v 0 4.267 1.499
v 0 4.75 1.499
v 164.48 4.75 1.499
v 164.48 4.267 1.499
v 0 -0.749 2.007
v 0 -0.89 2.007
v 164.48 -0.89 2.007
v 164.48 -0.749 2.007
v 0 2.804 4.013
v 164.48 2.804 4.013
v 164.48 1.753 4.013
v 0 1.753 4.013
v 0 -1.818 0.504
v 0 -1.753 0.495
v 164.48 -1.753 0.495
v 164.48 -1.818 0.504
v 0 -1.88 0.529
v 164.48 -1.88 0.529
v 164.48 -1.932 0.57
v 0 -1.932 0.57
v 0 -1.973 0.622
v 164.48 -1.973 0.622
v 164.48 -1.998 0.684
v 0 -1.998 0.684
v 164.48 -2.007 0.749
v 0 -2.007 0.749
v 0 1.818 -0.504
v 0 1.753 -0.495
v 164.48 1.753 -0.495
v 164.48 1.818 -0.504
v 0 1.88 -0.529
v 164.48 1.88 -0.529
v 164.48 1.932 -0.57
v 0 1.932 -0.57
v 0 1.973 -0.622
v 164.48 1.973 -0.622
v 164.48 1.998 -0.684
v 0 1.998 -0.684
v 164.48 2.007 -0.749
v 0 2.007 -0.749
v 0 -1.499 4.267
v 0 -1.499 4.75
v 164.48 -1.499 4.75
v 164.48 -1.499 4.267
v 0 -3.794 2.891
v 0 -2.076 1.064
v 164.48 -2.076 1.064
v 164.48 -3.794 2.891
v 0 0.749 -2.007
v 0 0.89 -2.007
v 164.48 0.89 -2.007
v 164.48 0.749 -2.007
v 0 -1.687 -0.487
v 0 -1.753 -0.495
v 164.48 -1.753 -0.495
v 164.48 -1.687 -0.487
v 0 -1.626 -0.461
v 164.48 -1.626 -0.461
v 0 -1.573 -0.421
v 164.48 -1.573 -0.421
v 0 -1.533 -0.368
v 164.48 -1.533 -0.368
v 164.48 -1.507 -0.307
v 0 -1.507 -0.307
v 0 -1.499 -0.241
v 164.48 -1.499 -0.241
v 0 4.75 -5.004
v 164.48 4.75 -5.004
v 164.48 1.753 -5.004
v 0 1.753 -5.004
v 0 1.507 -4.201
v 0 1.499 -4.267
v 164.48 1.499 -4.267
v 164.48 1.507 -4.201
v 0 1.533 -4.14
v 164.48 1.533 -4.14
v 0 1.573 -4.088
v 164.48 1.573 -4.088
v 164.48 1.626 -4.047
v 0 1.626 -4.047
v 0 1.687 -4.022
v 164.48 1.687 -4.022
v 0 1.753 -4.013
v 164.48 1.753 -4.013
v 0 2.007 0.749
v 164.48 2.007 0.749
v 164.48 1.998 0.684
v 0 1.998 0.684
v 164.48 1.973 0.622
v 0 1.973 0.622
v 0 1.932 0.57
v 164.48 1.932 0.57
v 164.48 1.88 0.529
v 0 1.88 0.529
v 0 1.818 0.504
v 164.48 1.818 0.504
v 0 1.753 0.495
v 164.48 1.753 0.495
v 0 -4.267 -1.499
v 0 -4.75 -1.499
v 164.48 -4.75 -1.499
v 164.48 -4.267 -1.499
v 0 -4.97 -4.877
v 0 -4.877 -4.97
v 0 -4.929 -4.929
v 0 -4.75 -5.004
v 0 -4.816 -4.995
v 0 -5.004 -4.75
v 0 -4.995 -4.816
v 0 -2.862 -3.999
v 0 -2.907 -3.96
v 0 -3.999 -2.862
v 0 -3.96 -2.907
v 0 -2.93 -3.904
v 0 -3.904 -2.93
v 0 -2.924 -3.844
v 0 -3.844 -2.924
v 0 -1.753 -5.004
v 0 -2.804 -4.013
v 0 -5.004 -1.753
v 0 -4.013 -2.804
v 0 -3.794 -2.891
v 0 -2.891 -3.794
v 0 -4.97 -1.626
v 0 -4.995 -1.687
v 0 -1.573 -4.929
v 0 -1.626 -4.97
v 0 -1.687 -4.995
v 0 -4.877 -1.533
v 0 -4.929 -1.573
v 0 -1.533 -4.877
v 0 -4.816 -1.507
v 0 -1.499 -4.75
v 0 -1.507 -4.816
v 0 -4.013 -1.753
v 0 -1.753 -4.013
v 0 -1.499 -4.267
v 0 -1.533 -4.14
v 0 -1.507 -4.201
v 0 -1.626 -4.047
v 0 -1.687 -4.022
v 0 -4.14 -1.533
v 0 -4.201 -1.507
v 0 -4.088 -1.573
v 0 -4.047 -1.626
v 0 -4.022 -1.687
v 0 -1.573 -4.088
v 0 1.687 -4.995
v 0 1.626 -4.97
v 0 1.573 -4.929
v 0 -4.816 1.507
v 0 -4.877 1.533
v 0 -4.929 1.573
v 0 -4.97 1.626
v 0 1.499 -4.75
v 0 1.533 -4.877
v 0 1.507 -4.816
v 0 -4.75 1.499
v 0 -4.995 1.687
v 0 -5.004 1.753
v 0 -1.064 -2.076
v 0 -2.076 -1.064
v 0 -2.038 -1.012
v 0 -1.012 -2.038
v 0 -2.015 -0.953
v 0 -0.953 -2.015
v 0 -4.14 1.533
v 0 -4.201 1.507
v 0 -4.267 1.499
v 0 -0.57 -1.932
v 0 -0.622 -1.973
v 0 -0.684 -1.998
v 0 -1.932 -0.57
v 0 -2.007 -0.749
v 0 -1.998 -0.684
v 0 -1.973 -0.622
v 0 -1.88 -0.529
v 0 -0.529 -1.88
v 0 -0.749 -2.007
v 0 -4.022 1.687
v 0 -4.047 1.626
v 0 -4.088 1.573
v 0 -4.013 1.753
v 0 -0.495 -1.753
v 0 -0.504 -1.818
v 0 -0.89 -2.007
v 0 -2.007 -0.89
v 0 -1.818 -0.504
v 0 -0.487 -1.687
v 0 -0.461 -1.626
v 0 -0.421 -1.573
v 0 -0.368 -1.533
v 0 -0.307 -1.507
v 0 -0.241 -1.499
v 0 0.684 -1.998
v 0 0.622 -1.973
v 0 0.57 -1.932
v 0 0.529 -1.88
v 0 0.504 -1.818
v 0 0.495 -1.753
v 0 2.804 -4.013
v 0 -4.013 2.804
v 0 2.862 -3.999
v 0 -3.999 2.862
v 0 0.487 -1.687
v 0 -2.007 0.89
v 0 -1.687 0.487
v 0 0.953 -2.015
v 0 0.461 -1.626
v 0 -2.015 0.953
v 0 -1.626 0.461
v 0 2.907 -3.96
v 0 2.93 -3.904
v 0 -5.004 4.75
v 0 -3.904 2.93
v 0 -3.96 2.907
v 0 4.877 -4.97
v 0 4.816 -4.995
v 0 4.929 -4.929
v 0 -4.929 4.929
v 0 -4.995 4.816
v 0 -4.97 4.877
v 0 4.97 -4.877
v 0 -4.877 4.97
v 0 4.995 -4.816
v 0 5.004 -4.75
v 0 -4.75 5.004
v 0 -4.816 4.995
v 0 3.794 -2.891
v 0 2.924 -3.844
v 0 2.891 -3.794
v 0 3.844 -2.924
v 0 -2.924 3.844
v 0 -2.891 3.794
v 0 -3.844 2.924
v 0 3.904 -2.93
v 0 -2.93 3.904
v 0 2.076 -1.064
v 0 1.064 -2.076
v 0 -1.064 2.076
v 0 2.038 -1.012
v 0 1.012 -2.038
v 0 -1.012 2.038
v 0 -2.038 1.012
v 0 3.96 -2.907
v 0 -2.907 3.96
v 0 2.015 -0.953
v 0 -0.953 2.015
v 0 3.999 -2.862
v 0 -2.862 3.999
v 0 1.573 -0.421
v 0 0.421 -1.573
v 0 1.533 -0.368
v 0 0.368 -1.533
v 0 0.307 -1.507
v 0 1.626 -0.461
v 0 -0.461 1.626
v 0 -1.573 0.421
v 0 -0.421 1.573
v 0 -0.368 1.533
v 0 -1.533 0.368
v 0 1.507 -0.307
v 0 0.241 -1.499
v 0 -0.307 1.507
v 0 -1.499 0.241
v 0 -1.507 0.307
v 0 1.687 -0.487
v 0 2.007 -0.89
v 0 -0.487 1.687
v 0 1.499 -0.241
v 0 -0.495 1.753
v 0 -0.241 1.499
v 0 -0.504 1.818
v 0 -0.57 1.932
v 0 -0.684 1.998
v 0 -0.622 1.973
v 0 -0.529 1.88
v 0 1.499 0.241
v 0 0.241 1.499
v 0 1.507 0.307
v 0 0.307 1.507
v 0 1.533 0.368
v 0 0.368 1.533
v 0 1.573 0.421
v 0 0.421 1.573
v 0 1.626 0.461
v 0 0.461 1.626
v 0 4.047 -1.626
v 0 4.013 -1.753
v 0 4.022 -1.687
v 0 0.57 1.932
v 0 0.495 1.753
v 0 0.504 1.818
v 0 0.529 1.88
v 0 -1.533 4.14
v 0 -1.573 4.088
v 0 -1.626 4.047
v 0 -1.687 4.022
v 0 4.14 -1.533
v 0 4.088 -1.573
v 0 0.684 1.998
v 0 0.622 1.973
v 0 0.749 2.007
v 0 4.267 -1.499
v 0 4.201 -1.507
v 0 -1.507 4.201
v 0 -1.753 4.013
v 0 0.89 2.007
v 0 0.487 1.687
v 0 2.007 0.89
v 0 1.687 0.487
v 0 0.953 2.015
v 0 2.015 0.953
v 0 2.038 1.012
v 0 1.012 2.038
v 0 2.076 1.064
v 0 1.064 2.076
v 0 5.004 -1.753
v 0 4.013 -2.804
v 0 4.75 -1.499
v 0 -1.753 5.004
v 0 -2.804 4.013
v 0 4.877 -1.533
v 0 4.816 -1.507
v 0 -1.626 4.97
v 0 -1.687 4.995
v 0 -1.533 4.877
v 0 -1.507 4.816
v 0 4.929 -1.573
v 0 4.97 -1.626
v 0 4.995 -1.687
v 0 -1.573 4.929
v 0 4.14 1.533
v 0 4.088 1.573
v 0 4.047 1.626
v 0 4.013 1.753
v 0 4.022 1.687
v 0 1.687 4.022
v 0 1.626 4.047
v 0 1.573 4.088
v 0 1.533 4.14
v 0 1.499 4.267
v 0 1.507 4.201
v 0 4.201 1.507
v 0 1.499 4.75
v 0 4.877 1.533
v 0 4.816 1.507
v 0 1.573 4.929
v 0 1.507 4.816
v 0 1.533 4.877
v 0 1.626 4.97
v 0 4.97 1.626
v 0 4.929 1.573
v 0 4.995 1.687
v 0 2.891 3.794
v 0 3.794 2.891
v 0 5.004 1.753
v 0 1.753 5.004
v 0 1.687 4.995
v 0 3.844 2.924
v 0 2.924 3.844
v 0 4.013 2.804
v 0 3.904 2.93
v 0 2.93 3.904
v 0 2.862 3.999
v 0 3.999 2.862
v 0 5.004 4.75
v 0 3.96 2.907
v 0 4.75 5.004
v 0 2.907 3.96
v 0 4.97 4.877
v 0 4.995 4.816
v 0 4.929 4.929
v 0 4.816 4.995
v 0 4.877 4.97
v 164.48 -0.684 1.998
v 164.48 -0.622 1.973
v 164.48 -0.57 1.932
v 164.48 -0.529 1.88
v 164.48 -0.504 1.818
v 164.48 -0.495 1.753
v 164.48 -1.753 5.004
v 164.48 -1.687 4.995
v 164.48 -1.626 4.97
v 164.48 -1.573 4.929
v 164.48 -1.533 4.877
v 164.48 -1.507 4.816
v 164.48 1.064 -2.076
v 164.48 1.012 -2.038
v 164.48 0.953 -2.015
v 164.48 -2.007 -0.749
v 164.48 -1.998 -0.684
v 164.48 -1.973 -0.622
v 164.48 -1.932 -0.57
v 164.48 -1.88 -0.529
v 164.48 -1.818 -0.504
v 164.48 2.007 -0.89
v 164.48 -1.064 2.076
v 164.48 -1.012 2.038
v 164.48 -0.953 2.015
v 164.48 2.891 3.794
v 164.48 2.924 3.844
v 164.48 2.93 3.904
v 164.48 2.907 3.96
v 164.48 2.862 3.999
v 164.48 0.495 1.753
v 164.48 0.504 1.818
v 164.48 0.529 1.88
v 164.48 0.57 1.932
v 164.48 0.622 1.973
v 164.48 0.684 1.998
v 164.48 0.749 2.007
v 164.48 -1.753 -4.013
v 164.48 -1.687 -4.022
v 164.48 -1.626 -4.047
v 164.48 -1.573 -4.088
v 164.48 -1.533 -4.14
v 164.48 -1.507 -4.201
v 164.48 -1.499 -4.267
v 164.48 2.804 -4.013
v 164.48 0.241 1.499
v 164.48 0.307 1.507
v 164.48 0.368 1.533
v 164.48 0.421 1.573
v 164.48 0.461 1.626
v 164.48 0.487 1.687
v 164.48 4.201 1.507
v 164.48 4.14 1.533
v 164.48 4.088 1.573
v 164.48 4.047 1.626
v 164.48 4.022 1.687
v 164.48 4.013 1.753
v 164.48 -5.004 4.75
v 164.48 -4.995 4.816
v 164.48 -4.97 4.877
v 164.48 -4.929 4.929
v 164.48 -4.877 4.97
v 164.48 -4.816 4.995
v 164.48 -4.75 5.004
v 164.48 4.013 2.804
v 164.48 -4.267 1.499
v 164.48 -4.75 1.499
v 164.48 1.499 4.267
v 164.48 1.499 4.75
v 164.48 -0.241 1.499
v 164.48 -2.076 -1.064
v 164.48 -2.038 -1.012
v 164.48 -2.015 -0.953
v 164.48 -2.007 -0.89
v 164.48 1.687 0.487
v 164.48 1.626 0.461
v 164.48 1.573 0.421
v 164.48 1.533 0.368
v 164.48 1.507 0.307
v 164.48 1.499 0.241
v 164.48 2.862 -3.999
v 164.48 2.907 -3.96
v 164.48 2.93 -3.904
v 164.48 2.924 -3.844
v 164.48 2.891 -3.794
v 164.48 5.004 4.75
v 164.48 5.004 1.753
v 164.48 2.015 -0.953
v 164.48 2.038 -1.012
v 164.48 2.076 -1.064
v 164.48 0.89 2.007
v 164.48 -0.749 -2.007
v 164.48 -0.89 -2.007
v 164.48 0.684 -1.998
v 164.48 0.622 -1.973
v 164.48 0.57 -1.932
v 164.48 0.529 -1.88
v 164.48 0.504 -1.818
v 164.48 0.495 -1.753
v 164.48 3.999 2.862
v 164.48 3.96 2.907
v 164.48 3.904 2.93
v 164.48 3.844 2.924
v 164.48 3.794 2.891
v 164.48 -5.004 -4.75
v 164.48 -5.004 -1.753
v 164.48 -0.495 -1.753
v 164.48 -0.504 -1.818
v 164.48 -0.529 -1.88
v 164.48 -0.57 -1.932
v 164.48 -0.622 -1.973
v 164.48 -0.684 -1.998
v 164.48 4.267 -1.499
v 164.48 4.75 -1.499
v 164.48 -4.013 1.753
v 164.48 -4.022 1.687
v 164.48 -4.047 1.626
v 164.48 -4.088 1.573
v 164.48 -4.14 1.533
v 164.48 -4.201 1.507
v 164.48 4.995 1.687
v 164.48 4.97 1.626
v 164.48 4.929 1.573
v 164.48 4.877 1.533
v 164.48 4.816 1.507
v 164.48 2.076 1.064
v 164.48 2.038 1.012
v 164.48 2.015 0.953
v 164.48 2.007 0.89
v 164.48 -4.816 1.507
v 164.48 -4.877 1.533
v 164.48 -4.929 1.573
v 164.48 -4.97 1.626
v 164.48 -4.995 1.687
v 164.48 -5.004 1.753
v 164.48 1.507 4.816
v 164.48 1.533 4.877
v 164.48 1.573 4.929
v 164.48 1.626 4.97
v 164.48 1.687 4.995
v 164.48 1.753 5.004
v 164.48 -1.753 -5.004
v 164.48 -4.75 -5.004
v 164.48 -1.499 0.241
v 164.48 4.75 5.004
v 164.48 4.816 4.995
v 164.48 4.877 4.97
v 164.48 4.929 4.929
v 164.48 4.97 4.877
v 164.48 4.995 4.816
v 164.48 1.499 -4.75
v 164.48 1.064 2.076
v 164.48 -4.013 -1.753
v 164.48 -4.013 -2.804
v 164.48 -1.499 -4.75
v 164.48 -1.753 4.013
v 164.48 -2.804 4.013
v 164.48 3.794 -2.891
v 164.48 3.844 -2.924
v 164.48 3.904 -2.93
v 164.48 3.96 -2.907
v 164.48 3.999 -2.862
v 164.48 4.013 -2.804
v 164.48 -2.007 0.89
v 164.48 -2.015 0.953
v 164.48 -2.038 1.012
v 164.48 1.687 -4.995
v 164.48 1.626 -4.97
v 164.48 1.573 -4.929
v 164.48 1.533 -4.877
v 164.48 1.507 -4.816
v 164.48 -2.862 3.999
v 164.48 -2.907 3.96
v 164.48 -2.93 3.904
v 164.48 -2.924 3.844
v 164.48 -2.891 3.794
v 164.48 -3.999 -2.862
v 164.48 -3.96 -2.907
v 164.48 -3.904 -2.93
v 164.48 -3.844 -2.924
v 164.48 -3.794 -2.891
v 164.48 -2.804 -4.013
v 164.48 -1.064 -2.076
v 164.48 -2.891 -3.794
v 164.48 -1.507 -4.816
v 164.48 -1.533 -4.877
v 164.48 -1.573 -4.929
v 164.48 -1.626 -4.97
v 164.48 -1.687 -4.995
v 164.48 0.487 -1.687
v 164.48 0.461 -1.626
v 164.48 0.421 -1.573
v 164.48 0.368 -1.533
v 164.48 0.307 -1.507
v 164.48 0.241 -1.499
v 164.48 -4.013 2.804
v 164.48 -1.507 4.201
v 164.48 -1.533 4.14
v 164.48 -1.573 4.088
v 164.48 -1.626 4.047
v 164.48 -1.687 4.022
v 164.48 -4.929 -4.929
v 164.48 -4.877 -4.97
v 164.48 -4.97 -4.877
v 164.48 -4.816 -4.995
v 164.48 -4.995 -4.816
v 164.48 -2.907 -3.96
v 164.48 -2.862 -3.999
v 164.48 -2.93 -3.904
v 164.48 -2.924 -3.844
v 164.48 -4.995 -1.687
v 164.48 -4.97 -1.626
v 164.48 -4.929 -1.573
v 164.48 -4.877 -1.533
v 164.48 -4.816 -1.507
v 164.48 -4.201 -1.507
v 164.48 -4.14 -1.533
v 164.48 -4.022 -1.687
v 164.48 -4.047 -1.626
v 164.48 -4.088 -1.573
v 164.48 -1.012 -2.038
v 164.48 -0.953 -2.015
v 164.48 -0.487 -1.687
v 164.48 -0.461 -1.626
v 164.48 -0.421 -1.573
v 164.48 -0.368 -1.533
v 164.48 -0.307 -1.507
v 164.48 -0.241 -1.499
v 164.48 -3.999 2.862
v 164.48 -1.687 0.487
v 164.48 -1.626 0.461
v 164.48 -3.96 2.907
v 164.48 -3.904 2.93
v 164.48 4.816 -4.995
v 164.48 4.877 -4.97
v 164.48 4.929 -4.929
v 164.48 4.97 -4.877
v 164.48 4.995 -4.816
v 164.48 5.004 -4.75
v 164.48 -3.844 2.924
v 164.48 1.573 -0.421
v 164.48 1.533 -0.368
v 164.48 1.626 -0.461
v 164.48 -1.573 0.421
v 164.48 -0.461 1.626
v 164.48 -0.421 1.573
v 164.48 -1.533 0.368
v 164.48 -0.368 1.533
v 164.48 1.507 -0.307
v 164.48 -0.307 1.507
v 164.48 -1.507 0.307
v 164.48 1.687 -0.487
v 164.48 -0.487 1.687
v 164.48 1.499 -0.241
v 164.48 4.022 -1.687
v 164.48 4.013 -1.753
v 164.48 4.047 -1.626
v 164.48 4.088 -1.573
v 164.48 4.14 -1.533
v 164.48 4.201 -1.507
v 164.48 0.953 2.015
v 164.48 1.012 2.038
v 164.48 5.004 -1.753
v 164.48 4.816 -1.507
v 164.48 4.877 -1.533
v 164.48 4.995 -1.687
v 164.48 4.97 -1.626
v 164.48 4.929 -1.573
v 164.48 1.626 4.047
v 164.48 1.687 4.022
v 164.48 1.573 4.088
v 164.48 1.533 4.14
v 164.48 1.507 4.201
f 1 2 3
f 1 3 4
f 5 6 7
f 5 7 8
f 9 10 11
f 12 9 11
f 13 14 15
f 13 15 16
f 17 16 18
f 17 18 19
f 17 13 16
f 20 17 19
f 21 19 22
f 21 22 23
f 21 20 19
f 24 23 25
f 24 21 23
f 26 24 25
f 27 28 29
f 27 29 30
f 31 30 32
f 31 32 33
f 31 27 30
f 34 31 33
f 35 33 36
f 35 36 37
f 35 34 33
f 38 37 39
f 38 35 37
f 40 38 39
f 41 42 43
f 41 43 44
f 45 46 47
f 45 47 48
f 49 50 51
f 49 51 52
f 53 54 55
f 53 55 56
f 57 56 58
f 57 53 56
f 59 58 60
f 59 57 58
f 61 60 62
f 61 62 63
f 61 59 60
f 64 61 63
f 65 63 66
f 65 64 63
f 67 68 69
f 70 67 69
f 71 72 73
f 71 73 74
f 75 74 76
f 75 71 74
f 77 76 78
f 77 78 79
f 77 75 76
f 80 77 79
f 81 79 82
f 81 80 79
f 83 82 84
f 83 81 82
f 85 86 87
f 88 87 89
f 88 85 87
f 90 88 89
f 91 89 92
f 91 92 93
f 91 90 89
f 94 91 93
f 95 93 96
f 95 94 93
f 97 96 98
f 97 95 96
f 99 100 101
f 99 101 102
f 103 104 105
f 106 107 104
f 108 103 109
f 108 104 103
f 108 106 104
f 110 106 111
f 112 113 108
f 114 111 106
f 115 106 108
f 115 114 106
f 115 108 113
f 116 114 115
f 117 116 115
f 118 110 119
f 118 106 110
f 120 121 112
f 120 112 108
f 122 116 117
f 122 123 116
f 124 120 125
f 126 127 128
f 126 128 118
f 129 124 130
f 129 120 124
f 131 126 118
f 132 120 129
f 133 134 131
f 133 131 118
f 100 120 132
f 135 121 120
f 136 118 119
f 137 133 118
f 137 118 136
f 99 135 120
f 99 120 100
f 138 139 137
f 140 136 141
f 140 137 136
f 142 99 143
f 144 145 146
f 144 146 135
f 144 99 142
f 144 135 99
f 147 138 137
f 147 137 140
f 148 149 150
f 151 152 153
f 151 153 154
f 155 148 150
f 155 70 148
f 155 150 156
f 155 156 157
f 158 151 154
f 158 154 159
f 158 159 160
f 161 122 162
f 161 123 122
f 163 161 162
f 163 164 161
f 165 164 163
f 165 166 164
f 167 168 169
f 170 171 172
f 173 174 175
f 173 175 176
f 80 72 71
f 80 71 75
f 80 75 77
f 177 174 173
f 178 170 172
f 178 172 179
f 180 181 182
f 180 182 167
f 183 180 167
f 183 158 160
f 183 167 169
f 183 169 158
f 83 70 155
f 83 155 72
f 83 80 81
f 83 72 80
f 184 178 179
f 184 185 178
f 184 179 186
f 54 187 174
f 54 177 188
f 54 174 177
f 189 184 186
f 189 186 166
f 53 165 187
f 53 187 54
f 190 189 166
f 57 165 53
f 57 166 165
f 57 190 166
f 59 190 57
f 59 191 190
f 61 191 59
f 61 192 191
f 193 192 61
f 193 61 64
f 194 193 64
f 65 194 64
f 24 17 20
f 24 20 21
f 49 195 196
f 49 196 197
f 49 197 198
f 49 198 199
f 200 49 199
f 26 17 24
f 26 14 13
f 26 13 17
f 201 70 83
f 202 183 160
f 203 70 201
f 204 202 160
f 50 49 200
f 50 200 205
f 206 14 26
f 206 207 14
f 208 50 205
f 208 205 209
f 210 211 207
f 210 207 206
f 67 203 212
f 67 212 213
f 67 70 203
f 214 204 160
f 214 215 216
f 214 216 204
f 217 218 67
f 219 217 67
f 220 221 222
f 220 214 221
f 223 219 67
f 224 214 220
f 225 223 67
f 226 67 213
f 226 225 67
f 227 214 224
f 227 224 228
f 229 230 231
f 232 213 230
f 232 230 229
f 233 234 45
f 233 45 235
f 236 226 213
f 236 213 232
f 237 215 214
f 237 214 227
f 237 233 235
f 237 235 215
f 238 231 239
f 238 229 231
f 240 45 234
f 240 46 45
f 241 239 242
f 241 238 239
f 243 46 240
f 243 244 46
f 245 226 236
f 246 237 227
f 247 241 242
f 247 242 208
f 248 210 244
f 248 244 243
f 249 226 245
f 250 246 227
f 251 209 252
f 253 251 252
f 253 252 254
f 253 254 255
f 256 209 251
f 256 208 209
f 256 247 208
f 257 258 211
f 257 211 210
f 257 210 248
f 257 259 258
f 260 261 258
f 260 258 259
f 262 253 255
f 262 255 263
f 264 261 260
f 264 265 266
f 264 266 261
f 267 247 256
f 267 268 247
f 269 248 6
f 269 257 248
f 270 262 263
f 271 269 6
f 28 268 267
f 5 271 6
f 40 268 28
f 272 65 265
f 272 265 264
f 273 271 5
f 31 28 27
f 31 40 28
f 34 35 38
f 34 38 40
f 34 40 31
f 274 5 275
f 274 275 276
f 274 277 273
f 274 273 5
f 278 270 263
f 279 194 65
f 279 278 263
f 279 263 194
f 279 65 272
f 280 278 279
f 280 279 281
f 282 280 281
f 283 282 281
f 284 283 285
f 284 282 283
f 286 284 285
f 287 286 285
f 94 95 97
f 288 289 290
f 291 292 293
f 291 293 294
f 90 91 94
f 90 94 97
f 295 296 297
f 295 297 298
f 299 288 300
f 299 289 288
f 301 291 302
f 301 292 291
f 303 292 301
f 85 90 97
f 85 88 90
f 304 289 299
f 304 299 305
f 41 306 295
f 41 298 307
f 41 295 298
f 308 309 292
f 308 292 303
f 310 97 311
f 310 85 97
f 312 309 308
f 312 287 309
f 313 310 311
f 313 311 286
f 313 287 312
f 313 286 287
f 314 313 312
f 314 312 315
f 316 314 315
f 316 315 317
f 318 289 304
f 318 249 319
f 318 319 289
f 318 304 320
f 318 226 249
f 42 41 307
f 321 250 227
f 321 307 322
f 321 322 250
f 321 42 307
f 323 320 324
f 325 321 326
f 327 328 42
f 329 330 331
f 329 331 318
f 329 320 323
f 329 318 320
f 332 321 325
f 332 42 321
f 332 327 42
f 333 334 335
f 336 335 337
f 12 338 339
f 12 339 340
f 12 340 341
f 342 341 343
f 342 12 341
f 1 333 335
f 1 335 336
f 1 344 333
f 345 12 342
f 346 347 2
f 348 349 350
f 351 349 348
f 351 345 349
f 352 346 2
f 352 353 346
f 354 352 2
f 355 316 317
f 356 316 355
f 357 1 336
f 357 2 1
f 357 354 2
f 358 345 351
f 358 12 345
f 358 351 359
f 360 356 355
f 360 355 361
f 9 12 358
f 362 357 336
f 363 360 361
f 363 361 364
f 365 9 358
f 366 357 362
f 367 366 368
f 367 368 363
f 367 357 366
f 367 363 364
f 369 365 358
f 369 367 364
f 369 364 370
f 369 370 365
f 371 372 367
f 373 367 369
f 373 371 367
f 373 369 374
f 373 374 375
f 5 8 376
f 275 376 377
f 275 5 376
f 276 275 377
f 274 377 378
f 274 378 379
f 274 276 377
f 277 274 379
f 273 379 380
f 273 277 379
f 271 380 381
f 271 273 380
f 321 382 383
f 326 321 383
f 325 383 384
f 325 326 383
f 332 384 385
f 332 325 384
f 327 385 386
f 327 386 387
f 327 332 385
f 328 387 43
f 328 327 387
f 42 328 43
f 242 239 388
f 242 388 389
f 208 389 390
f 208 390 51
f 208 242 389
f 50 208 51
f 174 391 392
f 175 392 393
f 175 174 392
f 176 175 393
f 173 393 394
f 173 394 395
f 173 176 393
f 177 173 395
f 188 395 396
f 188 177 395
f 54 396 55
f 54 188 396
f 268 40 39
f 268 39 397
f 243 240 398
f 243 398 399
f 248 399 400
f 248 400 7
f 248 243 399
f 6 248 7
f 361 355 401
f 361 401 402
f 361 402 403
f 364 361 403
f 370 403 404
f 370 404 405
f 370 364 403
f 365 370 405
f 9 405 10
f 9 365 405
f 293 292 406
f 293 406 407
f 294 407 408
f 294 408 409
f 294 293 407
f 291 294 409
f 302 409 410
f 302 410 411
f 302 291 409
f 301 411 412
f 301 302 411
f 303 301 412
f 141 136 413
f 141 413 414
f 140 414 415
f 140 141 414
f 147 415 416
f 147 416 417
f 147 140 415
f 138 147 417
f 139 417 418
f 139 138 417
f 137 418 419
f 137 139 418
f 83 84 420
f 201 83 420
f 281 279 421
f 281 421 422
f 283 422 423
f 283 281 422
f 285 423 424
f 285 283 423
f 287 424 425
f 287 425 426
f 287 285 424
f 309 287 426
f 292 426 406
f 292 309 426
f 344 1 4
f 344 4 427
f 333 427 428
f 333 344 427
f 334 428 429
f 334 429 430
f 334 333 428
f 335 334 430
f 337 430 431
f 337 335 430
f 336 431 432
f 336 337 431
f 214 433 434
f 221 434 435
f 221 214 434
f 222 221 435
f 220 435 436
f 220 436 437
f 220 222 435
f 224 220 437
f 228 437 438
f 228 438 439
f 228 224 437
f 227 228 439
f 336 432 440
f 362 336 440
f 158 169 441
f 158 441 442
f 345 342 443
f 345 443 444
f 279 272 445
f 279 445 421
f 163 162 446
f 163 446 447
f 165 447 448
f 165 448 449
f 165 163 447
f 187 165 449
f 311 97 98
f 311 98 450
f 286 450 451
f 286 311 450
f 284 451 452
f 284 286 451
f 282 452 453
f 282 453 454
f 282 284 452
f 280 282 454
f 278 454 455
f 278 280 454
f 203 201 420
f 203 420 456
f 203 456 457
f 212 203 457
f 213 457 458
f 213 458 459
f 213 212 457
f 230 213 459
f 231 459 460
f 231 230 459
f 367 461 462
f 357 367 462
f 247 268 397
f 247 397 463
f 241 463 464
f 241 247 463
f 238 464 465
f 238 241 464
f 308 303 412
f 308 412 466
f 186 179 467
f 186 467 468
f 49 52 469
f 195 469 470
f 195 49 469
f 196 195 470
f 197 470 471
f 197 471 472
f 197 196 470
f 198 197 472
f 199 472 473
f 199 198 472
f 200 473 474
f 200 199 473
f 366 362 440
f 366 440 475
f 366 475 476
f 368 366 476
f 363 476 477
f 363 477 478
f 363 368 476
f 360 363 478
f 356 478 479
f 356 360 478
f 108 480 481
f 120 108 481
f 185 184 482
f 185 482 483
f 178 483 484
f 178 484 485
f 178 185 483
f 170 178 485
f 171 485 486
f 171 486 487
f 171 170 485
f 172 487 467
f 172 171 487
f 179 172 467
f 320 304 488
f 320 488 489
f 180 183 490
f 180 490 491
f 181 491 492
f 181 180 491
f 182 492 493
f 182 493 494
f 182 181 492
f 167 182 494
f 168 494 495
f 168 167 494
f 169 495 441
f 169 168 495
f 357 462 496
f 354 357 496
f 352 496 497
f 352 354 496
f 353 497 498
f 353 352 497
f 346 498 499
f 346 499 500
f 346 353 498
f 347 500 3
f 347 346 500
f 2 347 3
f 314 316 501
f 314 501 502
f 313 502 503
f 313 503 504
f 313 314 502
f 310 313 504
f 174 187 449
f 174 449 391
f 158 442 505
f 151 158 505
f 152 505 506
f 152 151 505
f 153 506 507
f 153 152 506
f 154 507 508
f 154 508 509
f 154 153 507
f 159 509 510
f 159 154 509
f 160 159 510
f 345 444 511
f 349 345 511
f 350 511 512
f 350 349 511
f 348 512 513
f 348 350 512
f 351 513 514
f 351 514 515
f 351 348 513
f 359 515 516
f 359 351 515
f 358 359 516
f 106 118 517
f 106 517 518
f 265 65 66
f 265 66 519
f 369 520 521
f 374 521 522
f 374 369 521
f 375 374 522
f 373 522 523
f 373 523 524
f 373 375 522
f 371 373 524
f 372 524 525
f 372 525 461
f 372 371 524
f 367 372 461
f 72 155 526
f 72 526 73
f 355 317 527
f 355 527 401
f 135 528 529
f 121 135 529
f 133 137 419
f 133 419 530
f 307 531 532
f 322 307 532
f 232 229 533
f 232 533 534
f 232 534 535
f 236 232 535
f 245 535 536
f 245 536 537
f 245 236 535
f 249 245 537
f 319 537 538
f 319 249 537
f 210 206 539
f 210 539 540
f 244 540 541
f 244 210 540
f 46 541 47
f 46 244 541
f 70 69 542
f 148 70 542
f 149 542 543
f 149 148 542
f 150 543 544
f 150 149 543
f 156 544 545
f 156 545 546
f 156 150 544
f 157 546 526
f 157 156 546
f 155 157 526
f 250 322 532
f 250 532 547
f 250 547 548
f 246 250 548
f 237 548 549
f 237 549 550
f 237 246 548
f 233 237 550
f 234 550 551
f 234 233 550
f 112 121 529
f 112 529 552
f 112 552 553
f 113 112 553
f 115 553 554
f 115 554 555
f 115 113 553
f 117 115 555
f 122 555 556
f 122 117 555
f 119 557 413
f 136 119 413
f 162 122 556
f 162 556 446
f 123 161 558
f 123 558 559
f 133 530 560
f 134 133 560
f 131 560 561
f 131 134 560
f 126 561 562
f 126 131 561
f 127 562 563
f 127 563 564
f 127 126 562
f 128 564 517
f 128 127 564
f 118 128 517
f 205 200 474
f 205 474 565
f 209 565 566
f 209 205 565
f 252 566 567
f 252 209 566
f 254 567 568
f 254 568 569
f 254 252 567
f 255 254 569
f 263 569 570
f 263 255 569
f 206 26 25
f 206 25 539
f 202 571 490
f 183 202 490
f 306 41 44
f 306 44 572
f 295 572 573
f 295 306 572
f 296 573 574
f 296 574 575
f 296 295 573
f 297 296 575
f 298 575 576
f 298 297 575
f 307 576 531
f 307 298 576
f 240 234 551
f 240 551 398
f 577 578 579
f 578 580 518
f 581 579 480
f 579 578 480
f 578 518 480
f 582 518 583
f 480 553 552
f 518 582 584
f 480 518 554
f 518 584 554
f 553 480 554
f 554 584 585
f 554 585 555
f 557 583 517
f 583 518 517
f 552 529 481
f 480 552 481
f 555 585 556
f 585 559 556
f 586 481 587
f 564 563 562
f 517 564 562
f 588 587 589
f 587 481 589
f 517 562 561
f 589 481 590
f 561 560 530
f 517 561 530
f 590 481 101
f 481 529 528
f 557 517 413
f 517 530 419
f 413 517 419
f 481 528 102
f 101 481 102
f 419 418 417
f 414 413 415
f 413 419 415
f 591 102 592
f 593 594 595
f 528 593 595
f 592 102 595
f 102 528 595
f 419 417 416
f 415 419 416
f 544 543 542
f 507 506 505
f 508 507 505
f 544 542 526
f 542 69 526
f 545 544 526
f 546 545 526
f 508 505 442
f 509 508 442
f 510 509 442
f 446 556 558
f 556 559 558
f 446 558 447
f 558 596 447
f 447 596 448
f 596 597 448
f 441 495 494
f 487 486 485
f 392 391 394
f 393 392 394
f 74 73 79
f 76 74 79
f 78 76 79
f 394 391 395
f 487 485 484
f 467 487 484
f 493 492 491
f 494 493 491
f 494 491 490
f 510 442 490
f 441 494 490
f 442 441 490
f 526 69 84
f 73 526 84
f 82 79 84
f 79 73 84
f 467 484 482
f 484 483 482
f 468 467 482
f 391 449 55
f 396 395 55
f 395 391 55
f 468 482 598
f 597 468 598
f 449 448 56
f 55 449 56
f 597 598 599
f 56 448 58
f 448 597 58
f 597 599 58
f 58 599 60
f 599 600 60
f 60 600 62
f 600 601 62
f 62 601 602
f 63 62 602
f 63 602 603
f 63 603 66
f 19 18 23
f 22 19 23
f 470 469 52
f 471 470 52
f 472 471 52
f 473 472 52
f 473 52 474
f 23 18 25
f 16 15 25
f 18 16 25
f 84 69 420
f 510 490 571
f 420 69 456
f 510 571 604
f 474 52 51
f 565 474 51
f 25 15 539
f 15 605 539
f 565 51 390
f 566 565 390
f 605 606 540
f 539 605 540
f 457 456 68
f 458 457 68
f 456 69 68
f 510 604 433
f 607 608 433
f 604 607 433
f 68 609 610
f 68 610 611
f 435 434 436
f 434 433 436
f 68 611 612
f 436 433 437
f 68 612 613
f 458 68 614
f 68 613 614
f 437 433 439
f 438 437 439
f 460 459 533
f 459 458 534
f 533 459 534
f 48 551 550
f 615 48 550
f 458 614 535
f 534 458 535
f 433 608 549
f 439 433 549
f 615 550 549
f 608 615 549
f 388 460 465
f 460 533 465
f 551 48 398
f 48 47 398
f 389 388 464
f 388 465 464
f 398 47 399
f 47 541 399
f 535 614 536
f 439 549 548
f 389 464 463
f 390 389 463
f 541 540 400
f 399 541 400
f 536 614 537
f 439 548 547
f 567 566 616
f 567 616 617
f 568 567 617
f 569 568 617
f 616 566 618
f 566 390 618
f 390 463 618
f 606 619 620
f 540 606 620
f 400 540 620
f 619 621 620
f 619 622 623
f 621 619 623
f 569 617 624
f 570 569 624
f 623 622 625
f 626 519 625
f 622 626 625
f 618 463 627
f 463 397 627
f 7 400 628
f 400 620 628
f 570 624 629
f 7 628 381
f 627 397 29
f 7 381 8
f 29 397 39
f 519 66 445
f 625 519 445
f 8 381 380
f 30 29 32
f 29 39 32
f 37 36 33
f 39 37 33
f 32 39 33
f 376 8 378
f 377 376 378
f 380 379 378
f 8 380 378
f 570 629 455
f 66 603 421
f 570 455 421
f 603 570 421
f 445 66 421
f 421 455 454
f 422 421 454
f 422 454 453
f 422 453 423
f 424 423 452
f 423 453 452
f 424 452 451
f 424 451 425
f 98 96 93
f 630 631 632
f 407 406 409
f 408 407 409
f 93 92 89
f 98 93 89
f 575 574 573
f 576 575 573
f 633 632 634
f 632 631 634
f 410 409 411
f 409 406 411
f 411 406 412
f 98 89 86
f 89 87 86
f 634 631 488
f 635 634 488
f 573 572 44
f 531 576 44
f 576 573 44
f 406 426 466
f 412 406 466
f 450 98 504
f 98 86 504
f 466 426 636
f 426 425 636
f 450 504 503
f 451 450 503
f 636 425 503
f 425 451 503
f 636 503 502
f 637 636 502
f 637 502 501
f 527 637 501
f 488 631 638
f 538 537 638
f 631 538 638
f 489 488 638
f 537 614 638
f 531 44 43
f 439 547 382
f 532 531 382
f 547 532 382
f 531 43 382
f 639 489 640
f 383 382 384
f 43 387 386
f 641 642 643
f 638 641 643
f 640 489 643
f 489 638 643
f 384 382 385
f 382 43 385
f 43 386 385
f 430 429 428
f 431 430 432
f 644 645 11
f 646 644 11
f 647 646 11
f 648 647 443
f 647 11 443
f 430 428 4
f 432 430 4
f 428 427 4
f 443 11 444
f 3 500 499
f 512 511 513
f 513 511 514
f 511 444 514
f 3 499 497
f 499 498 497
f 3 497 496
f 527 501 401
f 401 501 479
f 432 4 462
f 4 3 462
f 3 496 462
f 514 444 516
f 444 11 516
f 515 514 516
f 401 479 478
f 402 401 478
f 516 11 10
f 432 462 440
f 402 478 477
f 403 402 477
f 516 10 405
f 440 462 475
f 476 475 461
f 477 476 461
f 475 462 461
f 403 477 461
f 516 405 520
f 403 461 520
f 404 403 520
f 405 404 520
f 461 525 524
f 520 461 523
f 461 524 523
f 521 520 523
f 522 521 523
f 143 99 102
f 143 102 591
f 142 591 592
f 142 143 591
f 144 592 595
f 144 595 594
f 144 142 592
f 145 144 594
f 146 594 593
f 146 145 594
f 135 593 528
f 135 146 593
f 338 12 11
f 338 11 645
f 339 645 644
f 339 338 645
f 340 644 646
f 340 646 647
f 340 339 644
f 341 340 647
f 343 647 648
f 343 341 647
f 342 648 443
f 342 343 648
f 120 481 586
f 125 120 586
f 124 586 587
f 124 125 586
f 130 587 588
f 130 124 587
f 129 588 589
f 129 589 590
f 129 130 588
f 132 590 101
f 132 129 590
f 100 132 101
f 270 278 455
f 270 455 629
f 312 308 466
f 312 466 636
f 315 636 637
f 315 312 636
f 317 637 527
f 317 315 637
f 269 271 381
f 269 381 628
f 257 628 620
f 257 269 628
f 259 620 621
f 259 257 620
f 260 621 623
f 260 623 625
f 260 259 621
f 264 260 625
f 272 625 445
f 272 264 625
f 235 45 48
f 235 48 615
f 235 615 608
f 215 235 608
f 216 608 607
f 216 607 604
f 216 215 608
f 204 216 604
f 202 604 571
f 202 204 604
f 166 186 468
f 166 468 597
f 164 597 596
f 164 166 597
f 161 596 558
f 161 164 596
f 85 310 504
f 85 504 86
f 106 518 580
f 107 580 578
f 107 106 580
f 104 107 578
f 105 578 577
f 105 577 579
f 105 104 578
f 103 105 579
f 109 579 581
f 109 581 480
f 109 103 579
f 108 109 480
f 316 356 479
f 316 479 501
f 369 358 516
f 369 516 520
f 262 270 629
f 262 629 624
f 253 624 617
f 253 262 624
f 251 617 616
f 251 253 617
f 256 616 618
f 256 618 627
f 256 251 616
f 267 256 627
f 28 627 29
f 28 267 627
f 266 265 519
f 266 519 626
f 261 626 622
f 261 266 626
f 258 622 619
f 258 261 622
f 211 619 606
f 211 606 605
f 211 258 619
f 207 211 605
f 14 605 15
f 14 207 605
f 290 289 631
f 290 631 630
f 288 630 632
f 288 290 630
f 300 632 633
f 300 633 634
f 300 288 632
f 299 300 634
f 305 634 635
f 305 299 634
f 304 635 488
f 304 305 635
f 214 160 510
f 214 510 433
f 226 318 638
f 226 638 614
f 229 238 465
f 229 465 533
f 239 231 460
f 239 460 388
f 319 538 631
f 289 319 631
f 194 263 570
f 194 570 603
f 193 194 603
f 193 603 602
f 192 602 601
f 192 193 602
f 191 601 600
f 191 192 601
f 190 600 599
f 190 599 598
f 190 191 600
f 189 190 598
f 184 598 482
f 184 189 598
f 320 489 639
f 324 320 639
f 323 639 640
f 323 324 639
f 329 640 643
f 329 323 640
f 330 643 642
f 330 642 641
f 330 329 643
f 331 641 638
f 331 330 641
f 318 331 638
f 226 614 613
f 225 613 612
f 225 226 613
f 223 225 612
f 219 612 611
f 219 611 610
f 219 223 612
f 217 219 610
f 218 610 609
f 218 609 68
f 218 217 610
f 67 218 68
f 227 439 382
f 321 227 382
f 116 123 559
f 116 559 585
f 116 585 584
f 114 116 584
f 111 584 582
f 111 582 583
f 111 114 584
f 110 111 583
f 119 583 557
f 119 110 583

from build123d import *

# Parameters (mm, degrees)
BOSS_EXTRU_1_DEPTH = 164.48


with BuildPart() as part:
    # Sketch1 → Boss.-Extru.1 (new body)
    with BuildSketch(Plane(origin=(0, 0, 0), x_dir=(0, 0, -1), z_dir=(1, 0, 0))):
        with BuildLine():
            Line((-0.2413, 1.4986), (0.2413, 1.4986))
            ThreePointArc((0.2413, 1.4986), (0.420905122, 1.572994878), (0.4953, 1.7526))
            ThreePointArc((0.4953, 1.7526), (0.569694878, 1.932205122), (0.7493, 2.0066))
            Line((0.7493, 2.0066), (0.889923986, 2.0066))
            ThreePointArc((0.889923986, 2.0066), (0.983516259, 2.024471886), (1.063937899, 2.075572548))
            Line((1.063937899, 2.075572548), (2.890793, 3.793686274))
            ThreePointArc((2.890793, 3.793686274), (2.921850101, 3.932996137), (2.803786044, 4.0132))
            Line((2.803786044, 4.0132), (1.7526, 4.0132))
            ThreePointArc((1.7526, 4.0132), (1.572994878, 4.087594878), (1.4986, 4.2672))
            Line((1.4986, 4.2672), (1.4986, 4.7498))
            ThreePointArc((1.4986, 4.7498), (1.572994878, 4.929405122), (1.7526, 5.0038))
            Line((1.7526, 5.0038), (4.7498, 5.0038))
            ThreePointArc((4.7498, 5.0038), (4.929405122, 4.929405122), (5.0038, 4.7498))
            Line((5.0038, 4.7498), (5.0038, 1.7526))
            ThreePointArc((5.0038, 1.7526), (4.929405122, 1.572994878), (4.7498, 1.4986))
            Line((4.7498, 1.4986), (4.2672, 1.4986))
            ThreePointArc((4.2672, 1.4986), (4.087594878, 1.572994878), (4.0132, 1.7526))
            Line((4.0132, 1.7526), (4.0132, 2.803786044))
            ThreePointArc((4.0132, 2.803786044), (3.932996137, 2.921850101), (3.793686274, 2.890793))
            Line((3.793686274, 2.890793), (2.075572548, 1.063937899))
            ThreePointArc((2.075572548, 1.063937899), (2.024471886, 0.983516259), (2.0066, 0.889923986))
            Line((2.0066, 0.889923986), (2.0066, 0.7493))
            ThreePointArc((2.0066, 0.7493), (1.932205122, 0.569694878), (1.7526, 0.4953))
            ThreePointArc((1.7526, 0.4953), (1.572994878, 0.420905122), (1.4986, 0.2413))
            Line((1.4986, 0.2413), (1.4986, -0.2413))
            ThreePointArc((1.4986, -0.2413), (1.572994878, -0.420905122), (1.7526, -0.4953))
            ThreePointArc((1.7526, -0.4953), (1.932205122, -0.569694878), (2.0066, -0.7493))
            Line((2.0066, -0.7493), (2.0066, -0.889923986))
            ThreePointArc((2.0066, -0.889923986), (2.024471886, -0.983516259), (2.075572548, -1.063937899))
            Line((2.075572548, -1.063937899), (3.793686274, -2.890793))
            ThreePointArc((3.793686274, -2.890793), (3.932996137, -2.921850101), (4.0132, -2.803786044))
            Line((4.0132, -2.803786044), (4.0132, -1.7526))
            ThreePointArc((4.0132, -1.7526), (4.087594878, -1.572994878), (4.2672, -1.4986))
            Line((4.2672, -1.4986), (4.7498, -1.4986))
            ThreePointArc((4.7498, -1.4986), (4.929405122, -1.572994878), (5.0038, -1.7526))
            Line((5.0038, -1.7526), (5.0038, -4.7498))
            ThreePointArc((5.0038, -4.7498), (4.929405122, -4.929405122), (4.7498, -5.0038))
            Line((4.7498, -5.0038), (1.7526, -5.0038))
            ThreePointArc((1.7526, -5.0038), (1.572994878, -4.929405122), (1.4986, -4.7498))
            Line((1.4986, -4.7498), (1.4986, -4.2672))
            ThreePointArc((1.4986, -4.2672), (1.572994878, -4.087594878), (1.7526, -4.0132))
            Line((1.7526, -4.0132), (2.803786044, -4.0132))
            ThreePointArc((2.803786044, -4.0132), (2.921850101, -3.932996137), (2.890793, -3.793686274))
            Line((2.890793, -3.793686274), (1.063937899, -2.075572548))
            ThreePointArc((1.063937899, -2.075572548), (0.983516259, -2.024471886), (0.889923986, -2.0066))
            Line((0.889923986, -2.0066), (0.7493, -2.0066))
            ThreePointArc((0.7493, -2.0066), (0.569694878, -1.932205122), (0.4953, -1.7526))
            ThreePointArc((0.4953, -1.7526), (0.420905122, -1.572994878), (0.2413, -1.4986))
            Line((0.2413, -1.4986), (-0.2413, -1.4986))
            ThreePointArc((-0.2413, -1.4986), (-0.420905122, -1.572994878), (-0.4953, -1.7526))
            ThreePointArc((-0.4953, -1.7526), (-0.569694878, -1.932205122), (-0.7493, -2.0066))
            Line((-0.7493, -2.0066), (-0.889923986, -2.0066))
            ThreePointArc((-0.889923986, -2.0066), (-0.983516259, -2.024471886), (-1.063937899, -2.075572548))
            Line((-1.063937899, -2.075572548), (-2.890793, -3.793686274))
            ThreePointArc((-2.890793, -3.793686274), (-2.921850101, -3.932996137), (-2.803786044, -4.0132))
            Line((-2.803786044, -4.0132), (-1.7526, -4.0132))
            ThreePointArc((-1.7526, -4.0132), (-1.572994878, -4.087594878), (-1.4986, -4.2672))
            Line((-1.4986, -4.2672), (-1.4986, -4.7498))
            ThreePointArc((-1.4986, -4.7498), (-1.572994878, -4.929405122), (-1.7526, -5.0038))
            Line((-1.7526, -5.0038), (-4.7498, -5.0038))
            ThreePointArc((-4.7498, -5.0038), (-4.929405122, -4.929405122), (-5.0038, -4.7498))
            Line((-5.0038, -4.7498), (-5.0038, -1.7526))
            ThreePointArc((-5.0038, -1.7526), (-4.929405122, -1.572994878), (-4.7498, -1.4986))
            Line((-4.7498, -1.4986), (-4.2672, -1.4986))
            ThreePointArc((-4.2672, -1.4986), (-4.087594878, -1.572994878), (-4.0132, -1.7526))
            Line((-4.0132, -1.7526), (-4.0132, -2.803786044))
            ThreePointArc((-4.0132, -2.803786044), (-3.932996137, -2.921850101), (-3.793686274, -2.890793))
            Line((-3.793686274, -2.890793), (-2.075572548, -1.063937899))
            ThreePointArc((-2.075572548, -1.063937899), (-2.024471886, -0.983516259), (-2.0066, -0.889923986))
            Line((-2.0066, -0.889923986), (-2.0066, -0.7493))
            ThreePointArc((-2.0066, -0.7493), (-1.932205122, -0.569694878), (-1.7526, -0.4953))
            ThreePointArc((-1.7526, -0.4953), (-1.572994878, -0.420905122), (-1.4986, -0.2413))
            Line((-1.4986, -0.2413), (-1.4986, 0.2413))
            ThreePointArc((-1.4986, 0.2413), (-1.572994878, 0.420905122), (-1.7526, 0.4953))
            ThreePointArc((-1.7526, 0.4953), (-1.932205122, 0.569694878), (-2.0066, 0.7493))
            Line((-2.0066, 0.7493), (-2.0066, 0.889923986))
            ThreePointArc((-2.0066, 0.889923986), (-2.024471886, 0.983516259), (-2.075572548, 1.063937899))
            Line((-2.075572548, 1.063937899), (-3.793686274, 2.890793))
            ThreePointArc((-3.793686274, 2.890793), (-3.932996137, 2.921850101), (-4.0132, 2.803786044))
            Line((-4.0132, 2.803786044), (-4.0132, 1.7526))
            ThreePointArc((-4.0132, 1.7526), (-4.087594878, 1.572994878), (-4.2672, 1.4986))
            Line((-4.2672, 1.4986), (-4.7498, 1.4986))
            ThreePointArc((-4.7498, 1.4986), (-4.929405122, 1.572994878), (-5.0038, 1.7526))
            Line((-5.0038, 1.7526), (-5.0038, 4.7498))
            ThreePointArc((-5.0038, 4.7498), (-4.929405122, 4.929405122), (-4.7498, 5.0038))
            Line((-4.7498, 5.0038), (-1.7526, 5.0038))
            ThreePointArc((-1.7526, 5.0038), (-1.572994878, 4.929405122), (-1.4986, 4.7498))
            Line((-1.4986, 4.7498), (-1.4986, 4.2672))
            ThreePointArc((-1.4986, 4.2672), (-1.572994878, 4.087594878), (-1.7526, 4.0132))
            Line((-1.7526, 4.0132), (-2.803786044, 4.0132))
            ThreePointArc((-2.803786044, 4.0132), (-2.921850101, 3.932996137), (-2.890793, 3.793686274))
            Line((-2.890793, 3.793686274), (-1.063937899, 2.075572548))
            ThreePointArc((-1.063937899, 2.075572548), (-0.983516259, 2.024471886), (-0.889923986, 2.0066))
            Line((-0.889923986, 2.0066), (-0.7493, 2.0066))
            ThreePointArc((-0.7493, 2.0066), (-0.569694878, 1.932205122), (-0.4953, 1.7526))
            ThreePointArc((-0.4953, 1.7526), (-0.420905122, 1.572994878), (-0.2413, 1.4986))
        make_face()
    extrude(amount=BOSS_EXTRU_1_DEPTH)


solid = part.part
